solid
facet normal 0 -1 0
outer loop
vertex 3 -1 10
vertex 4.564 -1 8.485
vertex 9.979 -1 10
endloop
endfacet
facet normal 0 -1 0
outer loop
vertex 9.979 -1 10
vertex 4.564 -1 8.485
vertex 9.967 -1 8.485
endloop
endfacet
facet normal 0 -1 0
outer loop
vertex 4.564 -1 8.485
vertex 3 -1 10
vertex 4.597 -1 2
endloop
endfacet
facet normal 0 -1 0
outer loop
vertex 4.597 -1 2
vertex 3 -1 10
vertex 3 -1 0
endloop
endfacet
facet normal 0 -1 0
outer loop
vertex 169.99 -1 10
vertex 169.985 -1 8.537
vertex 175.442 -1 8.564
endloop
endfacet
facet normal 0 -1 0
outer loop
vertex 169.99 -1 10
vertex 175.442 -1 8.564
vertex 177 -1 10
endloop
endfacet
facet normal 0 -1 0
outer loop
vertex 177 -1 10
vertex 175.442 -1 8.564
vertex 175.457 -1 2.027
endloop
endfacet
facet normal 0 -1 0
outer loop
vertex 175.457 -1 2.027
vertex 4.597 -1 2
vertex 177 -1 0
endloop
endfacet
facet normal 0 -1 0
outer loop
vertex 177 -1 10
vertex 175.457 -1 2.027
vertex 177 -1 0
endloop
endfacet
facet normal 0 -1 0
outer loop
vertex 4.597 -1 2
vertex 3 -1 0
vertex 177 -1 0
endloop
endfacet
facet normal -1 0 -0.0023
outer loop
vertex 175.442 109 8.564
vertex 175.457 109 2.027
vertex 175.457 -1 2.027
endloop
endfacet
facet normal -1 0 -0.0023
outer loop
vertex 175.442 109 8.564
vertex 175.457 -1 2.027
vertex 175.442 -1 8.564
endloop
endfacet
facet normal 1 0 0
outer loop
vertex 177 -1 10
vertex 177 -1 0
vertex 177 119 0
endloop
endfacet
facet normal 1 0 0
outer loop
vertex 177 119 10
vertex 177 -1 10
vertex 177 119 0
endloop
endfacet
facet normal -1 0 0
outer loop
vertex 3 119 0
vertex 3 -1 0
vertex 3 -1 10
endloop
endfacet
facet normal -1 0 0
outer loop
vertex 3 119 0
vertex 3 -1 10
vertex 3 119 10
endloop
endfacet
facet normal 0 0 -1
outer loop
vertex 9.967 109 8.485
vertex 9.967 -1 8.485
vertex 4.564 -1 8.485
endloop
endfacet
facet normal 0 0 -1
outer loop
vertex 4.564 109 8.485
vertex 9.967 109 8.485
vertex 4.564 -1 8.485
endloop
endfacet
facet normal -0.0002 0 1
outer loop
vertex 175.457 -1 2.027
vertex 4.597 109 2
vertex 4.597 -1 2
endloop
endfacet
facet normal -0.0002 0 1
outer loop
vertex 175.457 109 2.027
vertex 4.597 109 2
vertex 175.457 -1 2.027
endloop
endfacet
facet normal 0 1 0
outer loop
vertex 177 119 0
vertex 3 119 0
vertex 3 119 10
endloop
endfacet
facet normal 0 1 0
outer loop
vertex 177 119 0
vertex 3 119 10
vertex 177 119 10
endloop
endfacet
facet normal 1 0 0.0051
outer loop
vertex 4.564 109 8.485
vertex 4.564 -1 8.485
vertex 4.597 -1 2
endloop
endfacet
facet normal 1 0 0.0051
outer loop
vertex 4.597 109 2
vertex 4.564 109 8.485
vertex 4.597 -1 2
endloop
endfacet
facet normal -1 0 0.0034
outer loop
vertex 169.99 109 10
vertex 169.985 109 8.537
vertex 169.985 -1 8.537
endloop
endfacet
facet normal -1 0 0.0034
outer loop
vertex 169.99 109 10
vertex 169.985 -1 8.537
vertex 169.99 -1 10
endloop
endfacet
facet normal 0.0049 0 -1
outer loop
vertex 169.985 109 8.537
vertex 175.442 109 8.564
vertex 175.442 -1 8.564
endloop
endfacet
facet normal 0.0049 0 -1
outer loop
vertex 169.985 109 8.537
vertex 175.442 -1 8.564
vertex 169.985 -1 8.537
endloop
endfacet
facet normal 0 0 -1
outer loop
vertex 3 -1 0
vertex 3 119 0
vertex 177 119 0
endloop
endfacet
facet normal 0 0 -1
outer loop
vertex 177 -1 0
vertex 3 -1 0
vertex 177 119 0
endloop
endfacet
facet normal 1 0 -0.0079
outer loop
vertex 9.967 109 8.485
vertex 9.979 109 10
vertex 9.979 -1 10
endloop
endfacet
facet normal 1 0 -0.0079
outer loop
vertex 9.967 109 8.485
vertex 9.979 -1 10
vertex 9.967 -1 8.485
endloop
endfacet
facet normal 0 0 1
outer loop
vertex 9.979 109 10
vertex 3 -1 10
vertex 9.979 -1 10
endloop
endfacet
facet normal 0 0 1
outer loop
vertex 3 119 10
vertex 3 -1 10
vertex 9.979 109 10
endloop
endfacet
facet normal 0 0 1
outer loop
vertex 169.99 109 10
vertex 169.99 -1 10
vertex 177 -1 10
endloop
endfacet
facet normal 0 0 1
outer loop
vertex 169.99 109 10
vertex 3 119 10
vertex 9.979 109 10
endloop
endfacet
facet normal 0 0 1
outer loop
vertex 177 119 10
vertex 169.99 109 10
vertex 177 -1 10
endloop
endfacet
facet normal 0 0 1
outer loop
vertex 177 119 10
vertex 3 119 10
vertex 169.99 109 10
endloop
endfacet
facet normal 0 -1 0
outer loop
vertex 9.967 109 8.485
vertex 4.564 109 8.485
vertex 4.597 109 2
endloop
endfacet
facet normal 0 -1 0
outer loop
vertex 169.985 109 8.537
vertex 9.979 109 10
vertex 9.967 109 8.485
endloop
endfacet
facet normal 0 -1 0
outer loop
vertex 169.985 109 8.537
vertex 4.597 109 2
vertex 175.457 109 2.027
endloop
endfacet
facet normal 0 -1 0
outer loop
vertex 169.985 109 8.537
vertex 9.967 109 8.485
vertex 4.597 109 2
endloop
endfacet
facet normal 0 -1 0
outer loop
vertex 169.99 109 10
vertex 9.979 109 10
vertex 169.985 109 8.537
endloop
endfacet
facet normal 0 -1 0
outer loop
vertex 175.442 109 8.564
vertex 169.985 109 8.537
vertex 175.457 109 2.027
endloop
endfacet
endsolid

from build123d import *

# Parameters (mm, degrees)
PAD012_DEPTH = 110
BOX_W        = 174
BOX_H        = 120
BOX_DEPTH    = 10


with BuildPart() as pad012:
    # Sketch015 → Pad012 (new body)
    with BuildSketch(Plane.XZ.offset(-110)):
        Polygon((10, 12.723166), (9.966702, 8.484643), (4.563902, 8.484643), (4.5972, 2), (175.457199, 2.027261), (175.44223, 8.564159), (169.985031, 8.536898), (170, 13), align=None)
    extrude(amount=PAD012_DEPTH)


with BuildPart() as pcb_holder:
    # Box → Box (new body)
    with BuildSketch(Plane(origin=(3, 0, 0), x_dir=(1, 0, 0), z_dir=(0, 0, 1))):
        with Locations((87, 60)):
            Rectangle(BOX_W, BOX_H)
    extrude(amount=BOX_DEPTH)

    # Cut003: cut Pad012
    add(pad012.part, mode=Mode.SUBTRACT)


with BuildPart() as pcb_holder_1:
    # Cut003 placement: moved
    add(pcb_holder.part.moved(Location((0, -1, 0))))


solid = pcb_holder_1.part
